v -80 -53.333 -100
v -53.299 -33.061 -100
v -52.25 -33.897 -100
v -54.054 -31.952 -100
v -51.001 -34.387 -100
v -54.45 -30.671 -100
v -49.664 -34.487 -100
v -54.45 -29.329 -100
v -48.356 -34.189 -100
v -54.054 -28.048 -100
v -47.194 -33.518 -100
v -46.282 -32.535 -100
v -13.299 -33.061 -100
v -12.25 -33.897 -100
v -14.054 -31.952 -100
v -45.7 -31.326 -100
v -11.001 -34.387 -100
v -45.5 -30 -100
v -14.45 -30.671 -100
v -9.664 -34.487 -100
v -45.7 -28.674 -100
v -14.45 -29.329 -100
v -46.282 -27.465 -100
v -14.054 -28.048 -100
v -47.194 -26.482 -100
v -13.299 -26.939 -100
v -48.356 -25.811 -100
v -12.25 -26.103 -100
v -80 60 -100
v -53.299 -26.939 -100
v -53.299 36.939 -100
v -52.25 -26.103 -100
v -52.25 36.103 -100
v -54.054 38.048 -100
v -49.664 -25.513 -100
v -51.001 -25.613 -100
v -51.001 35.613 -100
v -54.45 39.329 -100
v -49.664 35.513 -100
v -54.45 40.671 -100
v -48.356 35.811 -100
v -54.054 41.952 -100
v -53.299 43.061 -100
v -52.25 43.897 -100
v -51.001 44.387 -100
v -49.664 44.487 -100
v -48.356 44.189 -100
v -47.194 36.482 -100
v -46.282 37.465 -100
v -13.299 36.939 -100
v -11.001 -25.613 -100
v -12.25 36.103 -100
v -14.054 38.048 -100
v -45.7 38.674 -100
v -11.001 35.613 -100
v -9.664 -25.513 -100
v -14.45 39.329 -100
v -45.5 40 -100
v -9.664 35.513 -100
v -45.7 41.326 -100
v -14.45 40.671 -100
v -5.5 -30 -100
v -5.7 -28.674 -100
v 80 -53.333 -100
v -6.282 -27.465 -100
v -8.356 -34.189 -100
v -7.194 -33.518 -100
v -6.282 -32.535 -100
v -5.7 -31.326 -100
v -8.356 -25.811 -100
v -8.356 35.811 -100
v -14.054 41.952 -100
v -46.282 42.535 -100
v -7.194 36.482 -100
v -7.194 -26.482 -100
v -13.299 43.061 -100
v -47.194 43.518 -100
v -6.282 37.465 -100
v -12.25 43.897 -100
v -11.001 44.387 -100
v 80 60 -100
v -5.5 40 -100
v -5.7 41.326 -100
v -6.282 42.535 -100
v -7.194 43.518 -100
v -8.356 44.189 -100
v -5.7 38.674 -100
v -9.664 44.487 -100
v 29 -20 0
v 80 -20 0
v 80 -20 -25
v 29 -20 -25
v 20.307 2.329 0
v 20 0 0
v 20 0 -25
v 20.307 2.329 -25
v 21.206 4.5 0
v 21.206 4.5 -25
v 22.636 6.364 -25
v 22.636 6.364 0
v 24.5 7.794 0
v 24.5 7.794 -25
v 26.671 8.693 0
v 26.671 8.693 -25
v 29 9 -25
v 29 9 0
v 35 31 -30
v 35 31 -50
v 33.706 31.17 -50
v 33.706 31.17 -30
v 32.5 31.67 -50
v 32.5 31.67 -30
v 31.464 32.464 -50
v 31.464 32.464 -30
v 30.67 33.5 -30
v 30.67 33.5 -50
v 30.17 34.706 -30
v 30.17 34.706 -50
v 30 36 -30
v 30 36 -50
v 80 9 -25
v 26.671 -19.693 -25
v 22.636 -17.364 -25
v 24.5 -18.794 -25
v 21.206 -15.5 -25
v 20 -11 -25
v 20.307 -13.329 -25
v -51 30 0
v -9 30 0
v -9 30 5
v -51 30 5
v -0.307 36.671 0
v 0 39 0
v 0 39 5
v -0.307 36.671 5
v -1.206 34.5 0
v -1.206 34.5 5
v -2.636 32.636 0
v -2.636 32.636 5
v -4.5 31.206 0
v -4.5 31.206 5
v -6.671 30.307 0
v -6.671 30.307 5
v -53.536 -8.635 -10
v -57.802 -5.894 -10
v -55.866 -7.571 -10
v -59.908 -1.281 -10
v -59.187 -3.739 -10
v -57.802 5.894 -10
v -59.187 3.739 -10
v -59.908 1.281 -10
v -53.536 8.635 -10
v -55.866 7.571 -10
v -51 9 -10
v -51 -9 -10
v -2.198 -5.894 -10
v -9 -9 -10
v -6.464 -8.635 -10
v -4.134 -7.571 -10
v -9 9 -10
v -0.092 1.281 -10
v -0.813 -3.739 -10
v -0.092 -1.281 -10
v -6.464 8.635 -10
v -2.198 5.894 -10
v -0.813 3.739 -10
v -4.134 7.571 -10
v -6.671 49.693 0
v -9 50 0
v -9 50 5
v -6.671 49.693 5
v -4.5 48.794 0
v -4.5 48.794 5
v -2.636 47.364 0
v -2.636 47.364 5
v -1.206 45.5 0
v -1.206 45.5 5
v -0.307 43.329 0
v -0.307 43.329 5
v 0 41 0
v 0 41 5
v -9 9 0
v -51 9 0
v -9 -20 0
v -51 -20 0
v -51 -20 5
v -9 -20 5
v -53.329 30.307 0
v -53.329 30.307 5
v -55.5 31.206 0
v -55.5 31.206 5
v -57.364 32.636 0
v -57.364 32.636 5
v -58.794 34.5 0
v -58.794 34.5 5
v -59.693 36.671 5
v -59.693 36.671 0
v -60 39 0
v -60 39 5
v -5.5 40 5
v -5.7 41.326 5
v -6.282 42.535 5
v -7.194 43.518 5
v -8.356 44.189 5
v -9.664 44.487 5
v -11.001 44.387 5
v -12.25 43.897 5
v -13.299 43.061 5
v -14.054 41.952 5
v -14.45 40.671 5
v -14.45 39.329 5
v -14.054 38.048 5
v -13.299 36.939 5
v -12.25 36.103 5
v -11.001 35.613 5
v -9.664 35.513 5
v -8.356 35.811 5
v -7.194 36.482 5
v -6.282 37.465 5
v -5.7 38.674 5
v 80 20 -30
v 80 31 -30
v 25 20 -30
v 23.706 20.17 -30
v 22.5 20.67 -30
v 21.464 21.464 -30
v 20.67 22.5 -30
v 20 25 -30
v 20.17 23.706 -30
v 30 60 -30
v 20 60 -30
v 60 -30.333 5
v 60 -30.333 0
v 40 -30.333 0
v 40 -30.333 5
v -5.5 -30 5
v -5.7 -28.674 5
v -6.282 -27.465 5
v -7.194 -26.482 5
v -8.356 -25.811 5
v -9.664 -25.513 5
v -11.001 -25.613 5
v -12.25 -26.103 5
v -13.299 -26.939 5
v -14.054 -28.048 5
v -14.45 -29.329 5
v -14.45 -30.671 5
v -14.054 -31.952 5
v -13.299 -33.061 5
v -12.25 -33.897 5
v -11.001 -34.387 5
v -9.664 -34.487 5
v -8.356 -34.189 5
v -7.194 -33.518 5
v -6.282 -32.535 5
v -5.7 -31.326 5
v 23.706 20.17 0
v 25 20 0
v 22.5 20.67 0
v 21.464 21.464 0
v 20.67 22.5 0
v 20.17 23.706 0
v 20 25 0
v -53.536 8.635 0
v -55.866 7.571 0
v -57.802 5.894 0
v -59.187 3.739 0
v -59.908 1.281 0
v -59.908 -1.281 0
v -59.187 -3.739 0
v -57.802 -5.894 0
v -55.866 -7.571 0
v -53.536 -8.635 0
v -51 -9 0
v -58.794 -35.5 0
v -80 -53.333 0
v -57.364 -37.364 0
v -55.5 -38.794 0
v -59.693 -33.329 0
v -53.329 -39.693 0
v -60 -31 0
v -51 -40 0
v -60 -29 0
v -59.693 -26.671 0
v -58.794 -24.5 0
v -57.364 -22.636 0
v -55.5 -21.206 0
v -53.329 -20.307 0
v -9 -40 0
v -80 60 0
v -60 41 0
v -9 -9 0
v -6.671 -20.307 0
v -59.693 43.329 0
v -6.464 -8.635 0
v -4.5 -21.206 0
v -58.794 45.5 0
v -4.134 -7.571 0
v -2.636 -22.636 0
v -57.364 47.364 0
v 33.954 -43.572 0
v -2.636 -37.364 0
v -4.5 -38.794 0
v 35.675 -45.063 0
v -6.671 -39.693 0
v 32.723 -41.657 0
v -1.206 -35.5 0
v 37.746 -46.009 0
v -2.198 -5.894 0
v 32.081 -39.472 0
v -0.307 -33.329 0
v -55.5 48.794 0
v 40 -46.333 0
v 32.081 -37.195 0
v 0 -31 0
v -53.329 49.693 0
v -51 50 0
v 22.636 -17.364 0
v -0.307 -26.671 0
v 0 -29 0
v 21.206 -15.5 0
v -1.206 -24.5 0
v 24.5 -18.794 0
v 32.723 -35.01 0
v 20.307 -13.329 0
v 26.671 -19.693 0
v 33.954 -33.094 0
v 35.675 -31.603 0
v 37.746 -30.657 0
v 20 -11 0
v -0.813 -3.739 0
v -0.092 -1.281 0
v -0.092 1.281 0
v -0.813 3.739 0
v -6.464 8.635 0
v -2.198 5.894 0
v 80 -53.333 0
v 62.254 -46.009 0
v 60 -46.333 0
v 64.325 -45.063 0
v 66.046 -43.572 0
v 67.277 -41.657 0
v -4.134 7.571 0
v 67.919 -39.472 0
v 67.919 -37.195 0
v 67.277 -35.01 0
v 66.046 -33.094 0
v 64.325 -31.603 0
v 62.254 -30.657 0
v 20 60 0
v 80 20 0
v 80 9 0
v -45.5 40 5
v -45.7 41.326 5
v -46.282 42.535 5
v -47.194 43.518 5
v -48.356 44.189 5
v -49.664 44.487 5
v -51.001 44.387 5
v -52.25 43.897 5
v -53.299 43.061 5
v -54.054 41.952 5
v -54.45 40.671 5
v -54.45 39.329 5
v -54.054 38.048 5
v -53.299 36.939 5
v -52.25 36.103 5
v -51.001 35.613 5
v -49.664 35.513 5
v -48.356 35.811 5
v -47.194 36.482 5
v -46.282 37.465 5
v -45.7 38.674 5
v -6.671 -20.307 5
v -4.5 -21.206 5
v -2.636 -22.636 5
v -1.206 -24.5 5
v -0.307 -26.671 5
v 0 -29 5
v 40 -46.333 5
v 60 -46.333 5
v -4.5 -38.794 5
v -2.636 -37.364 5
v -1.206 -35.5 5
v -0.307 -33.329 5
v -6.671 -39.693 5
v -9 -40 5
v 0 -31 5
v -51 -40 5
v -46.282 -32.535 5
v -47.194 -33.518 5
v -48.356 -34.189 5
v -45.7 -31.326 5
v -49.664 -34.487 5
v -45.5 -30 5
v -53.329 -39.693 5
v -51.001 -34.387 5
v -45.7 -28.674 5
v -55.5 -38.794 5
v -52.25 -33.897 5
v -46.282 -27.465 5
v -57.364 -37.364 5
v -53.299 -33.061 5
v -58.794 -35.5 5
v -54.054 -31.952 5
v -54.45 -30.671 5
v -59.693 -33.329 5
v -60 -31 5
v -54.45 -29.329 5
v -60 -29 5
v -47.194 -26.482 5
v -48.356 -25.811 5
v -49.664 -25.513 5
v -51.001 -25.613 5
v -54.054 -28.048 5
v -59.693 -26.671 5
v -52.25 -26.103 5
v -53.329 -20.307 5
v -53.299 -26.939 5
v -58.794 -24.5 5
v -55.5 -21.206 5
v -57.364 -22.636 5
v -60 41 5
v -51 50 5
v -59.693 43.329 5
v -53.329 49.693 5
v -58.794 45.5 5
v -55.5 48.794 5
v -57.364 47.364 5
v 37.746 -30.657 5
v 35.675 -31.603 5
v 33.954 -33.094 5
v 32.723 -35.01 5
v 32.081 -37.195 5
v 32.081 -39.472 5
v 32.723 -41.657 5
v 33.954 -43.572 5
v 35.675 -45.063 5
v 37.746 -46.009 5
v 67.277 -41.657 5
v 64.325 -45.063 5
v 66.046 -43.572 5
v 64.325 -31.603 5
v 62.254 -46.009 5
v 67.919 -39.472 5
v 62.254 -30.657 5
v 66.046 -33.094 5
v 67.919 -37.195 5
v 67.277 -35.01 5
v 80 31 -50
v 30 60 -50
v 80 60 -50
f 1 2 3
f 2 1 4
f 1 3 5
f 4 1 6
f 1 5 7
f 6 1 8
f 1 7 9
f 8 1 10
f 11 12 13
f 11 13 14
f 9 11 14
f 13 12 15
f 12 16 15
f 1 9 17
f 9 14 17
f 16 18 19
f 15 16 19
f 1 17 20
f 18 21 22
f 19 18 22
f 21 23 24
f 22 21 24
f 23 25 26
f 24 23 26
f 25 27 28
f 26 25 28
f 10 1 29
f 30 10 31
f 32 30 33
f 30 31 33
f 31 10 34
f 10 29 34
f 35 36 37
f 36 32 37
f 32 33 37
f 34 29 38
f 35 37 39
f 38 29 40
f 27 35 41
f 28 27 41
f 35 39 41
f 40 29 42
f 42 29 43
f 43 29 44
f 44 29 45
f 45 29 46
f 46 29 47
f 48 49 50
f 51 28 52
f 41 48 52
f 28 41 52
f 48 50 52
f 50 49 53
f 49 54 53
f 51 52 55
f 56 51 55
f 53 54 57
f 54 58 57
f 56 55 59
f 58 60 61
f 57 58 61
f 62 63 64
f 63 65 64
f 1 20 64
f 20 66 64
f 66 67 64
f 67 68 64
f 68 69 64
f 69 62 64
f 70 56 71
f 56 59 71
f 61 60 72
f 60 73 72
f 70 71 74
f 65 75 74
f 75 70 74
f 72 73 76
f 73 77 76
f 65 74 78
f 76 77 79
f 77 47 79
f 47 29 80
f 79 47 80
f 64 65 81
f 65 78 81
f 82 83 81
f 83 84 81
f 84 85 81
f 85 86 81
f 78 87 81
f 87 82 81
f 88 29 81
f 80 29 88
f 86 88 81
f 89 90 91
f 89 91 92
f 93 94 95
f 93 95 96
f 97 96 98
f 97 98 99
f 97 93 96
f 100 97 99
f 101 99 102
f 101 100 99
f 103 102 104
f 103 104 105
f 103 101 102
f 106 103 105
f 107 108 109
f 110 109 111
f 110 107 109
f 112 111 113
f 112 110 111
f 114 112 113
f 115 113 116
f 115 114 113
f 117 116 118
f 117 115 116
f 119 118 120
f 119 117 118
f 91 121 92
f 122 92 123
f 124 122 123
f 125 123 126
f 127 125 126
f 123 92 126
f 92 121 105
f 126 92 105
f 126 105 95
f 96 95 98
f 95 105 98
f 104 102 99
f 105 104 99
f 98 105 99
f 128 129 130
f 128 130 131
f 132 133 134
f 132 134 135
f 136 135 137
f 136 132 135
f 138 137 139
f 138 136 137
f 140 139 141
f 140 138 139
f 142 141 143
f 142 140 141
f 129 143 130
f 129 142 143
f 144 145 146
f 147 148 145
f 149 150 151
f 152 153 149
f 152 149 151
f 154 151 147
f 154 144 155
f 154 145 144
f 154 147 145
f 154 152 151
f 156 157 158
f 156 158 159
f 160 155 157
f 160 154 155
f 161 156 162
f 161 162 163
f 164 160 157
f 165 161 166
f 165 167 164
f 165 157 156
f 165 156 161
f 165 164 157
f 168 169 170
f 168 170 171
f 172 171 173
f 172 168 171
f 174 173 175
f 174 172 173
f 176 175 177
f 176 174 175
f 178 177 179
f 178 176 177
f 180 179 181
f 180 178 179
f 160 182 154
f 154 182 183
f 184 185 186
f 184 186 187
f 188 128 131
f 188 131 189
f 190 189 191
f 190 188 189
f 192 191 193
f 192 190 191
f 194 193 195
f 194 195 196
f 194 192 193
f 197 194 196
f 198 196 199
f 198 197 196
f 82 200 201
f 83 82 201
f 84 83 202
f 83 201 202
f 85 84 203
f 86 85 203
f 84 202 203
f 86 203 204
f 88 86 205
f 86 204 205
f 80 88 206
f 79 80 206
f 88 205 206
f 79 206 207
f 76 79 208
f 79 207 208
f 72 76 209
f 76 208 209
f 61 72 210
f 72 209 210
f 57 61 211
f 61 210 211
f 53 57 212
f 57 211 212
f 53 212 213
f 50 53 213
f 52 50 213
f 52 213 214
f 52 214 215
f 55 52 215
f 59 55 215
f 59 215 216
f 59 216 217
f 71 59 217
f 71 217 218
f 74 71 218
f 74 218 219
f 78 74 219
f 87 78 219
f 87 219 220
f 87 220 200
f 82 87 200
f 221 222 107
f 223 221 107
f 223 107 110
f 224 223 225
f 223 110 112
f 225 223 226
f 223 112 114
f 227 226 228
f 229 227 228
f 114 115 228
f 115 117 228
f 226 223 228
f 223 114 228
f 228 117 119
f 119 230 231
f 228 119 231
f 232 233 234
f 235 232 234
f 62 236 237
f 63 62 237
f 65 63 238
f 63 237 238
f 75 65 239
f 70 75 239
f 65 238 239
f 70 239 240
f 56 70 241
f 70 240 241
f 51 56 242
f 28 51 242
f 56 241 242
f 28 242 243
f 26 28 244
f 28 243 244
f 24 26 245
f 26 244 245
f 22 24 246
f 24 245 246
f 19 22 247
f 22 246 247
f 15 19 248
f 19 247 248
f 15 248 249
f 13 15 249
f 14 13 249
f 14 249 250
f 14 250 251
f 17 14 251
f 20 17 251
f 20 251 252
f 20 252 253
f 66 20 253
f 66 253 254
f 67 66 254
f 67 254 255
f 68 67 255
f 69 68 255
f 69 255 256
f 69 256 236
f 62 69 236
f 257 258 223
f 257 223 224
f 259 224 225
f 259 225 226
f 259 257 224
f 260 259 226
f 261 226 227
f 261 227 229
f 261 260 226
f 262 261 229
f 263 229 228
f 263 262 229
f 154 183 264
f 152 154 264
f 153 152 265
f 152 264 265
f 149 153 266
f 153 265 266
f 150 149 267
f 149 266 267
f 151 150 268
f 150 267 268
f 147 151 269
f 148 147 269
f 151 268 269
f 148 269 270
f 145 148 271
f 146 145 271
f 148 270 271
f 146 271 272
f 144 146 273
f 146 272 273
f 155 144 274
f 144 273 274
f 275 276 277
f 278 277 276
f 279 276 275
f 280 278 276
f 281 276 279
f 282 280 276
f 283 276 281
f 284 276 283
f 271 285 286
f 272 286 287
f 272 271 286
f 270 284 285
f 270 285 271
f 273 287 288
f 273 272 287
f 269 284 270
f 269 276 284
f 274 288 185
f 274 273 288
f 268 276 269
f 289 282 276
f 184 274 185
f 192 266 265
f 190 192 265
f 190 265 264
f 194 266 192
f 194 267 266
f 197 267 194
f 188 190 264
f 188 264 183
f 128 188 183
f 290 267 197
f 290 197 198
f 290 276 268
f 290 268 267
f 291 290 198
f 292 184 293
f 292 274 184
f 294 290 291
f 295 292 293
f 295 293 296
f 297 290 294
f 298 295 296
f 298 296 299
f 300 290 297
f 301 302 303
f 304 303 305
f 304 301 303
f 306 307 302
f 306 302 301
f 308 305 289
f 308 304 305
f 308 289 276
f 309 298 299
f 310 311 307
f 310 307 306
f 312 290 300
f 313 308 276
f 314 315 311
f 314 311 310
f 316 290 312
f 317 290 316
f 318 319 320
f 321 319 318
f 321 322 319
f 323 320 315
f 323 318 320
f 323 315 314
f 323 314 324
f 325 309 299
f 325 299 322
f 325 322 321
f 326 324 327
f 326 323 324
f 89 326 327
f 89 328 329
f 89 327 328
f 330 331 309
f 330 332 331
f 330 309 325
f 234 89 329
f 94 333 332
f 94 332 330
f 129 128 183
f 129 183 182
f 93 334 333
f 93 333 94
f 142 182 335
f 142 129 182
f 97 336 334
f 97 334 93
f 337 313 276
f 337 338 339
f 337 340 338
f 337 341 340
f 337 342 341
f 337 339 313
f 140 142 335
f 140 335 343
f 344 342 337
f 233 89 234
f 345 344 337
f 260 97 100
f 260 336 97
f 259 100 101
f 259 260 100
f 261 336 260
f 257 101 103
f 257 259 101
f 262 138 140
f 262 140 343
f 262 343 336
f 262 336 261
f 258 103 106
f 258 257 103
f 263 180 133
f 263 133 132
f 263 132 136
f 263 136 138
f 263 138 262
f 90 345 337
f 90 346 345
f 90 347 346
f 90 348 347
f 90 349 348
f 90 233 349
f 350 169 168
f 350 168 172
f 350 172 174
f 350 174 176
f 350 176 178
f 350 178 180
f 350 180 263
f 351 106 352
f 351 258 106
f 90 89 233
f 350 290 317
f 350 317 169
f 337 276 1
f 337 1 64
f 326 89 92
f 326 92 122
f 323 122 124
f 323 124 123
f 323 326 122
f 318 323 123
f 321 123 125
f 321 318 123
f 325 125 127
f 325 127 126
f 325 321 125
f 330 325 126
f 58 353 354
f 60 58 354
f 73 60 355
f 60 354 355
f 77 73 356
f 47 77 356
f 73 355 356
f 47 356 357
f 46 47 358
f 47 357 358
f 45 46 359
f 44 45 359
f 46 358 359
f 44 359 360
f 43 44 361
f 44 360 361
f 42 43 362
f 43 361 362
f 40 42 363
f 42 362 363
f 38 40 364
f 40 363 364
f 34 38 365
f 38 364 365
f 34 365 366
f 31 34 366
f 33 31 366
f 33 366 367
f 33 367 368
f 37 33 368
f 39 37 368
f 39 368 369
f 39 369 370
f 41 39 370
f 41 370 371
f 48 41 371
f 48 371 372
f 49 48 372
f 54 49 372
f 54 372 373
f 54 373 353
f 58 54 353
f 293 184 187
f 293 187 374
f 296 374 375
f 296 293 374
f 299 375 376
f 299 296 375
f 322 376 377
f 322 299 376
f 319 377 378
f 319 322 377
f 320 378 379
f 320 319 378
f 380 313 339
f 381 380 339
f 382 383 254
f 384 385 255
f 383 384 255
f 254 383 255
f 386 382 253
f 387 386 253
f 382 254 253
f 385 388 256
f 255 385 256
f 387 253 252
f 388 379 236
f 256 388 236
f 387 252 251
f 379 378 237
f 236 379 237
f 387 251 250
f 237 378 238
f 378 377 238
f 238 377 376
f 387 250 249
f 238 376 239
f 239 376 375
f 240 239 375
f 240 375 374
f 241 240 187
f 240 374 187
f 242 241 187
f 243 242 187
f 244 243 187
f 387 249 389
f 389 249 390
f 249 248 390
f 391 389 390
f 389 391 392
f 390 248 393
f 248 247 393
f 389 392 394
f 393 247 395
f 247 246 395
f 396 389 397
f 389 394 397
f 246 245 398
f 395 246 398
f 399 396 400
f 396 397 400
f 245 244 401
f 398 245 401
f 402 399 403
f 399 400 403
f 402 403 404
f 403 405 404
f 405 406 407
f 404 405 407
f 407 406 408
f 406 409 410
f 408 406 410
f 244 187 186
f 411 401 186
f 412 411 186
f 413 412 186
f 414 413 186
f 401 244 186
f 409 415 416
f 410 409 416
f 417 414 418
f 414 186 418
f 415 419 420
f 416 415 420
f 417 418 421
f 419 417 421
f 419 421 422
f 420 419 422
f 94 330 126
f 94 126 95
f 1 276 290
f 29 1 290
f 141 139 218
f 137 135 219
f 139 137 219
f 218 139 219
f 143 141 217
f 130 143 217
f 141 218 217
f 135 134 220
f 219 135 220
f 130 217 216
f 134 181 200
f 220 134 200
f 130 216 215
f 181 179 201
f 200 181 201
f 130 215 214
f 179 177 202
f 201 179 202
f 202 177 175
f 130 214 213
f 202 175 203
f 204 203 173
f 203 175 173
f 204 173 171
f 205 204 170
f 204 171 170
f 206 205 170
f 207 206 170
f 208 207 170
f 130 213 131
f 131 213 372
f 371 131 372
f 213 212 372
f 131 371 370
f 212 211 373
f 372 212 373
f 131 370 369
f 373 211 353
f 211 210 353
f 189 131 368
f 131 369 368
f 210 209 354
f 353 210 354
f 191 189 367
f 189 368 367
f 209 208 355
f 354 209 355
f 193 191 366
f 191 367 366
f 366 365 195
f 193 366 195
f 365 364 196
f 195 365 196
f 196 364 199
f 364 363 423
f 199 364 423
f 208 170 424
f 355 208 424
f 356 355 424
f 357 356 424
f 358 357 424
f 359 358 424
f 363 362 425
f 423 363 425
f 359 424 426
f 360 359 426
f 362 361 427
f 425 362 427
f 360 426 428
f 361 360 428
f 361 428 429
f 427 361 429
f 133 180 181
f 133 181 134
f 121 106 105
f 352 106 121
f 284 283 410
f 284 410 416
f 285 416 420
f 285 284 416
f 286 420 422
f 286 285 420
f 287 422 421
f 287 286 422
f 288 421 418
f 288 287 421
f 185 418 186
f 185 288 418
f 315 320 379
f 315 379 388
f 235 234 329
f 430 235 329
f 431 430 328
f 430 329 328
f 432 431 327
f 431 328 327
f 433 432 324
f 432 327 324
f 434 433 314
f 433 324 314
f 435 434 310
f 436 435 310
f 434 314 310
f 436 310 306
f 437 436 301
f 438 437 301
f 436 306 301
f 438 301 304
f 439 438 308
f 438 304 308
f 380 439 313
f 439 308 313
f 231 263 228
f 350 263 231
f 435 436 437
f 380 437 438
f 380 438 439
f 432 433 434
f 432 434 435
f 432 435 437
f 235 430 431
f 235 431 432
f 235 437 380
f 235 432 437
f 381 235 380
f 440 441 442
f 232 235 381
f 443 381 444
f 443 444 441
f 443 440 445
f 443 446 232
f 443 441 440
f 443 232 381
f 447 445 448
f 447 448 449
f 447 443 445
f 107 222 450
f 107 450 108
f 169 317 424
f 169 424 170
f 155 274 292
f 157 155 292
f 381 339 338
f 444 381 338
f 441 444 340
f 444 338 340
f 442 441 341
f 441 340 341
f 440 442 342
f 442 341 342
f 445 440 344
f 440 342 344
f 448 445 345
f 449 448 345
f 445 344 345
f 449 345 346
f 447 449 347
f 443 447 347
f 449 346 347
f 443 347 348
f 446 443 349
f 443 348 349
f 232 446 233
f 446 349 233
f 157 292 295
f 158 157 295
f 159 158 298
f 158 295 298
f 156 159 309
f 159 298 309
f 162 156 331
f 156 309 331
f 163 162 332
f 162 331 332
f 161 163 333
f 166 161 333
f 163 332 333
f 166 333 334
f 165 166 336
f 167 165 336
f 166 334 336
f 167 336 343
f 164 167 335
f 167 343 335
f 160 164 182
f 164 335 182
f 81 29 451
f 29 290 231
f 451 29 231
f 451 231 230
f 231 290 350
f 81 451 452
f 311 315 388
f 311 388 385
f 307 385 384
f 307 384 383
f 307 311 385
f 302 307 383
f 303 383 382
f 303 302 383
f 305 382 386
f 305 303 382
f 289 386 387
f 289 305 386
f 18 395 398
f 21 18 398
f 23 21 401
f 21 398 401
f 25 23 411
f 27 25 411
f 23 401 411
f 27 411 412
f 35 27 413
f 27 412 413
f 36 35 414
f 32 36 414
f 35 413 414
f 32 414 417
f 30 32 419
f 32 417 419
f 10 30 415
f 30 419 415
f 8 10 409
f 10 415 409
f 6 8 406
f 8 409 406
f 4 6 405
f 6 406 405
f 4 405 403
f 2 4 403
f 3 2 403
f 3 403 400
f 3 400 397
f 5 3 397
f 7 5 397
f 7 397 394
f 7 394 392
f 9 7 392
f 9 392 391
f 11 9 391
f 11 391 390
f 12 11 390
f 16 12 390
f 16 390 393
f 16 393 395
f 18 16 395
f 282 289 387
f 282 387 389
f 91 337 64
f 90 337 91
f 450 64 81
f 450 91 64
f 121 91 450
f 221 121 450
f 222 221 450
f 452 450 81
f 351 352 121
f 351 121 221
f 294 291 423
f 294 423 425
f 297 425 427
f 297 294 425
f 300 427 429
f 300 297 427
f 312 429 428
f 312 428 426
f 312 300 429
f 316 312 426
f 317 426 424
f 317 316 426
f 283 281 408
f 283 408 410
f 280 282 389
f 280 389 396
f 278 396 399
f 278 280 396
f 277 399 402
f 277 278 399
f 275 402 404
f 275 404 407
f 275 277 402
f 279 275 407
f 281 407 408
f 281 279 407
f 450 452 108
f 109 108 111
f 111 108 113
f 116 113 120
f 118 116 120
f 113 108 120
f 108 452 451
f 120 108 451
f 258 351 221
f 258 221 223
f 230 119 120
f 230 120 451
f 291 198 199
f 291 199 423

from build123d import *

# Parameters (mm, degrees)
SKETCH1_W           = 160
SKETCH1_H           = 113.333333333
BASE_EXTRUDE_DEPTH  = 100
BOSS_EXTRUDE1_DEPTH = 5
CUT_EXTRUDE1_DEPTH  = 10
CUT_EXTRUDE2_DEPTH  = 30
CUT_EXTRUDE3_DEPTH  = 20
SKETCH7_R           = 4.5
CUT_EXTRUDE4_DEPTH  = 146
CUT_EXTRUDE5_DEPTH  = 25


with BuildPart() as part:
    # Sketch1 → Base-Extrude (new body)
    with BuildSketch(Plane.XY):
        with Locations((0, 3.333333334)):
            Rectangle(SKETCH1_W, SKETCH1_H)
    extrude(amount=-BASE_EXTRUDE_DEPTH)

    # Sketch2 → Boss-Extrude1 (add)
    with BuildSketch(Plane.XY):
        with BuildLine():
            Line((-51, -20), (-9, -20))
            ThreePointArc((-9, -20), (-2.636038969, -22.636038969), (0, -29))
            Line((0, -29), (0, -31))
            ThreePointArc((0, -31), (-2.636038969, -37.363961031), (-9, -40))
            Line((-9, -40), (-51, -40))
            ThreePointArc((-51, -40), (-57.363961031, -37.363961031), (-60, -31))
            Line((-60, -31), (-60, -29))
            ThreePointArc((-60, -29), (-57.363961031, -22.636038969), (-51, -20))
        make_face()
        with BuildLine():
            Line((-51, 50), (-9, 50))
            ThreePointArc((-9, 50), (-2.636038969, 47.363961031), (0, 41))
            Line((0, 41), (0, 39))
            ThreePointArc((0, 39), (-2.636038969, 32.636038969), (-9, 30))
            Line((-9, 30), (-51, 30))
            ThreePointArc((-51, 30), (-57.363961031, 32.636038969), (-60, 39))
            Line((-60, 39), (-60, 41))
            ThreePointArc((-60, 41), (-57.363961031, 47.363961031), (-51, 50))
        make_face()
        with BuildLine():
            Line((60, -30.333333333), (40, -30.333333333))
            ThreePointArc((40, -30.333333333), (32, -38.333333333), (40, -46.333333333))
            Line((40, -46.333333333), (60, -46.333333333))
            ThreePointArc((60, -46.333333333), (68, -38.333333333), (60, -30.333333333))
        make_face()
    extrude(amount=BOSS_EXTRUDE1_DEPTH)

    # Sketch3 → Cut-Extrude1 (cut)
    with BuildSketch(Plane.XY):
        with BuildLine():
            Line((-9, 9), (-51, 9))
            ThreePointArc((-51, 9), (-60, 0), (-51, -9))
            Line((-51, -9), (-9, -9))
            ThreePointArc((-9, -9), (0, 0), (-9, 9))
        make_face()
    extrude(amount=-CUT_EXTRUDE1_DEPTH, mode=Mode.SUBTRACT)

    # Sketch4 → Cut-Extrude2 (cut)
    with BuildSketch(Plane.XY):
        with BuildLine():
            Line((20, 80), (93.333333333, 80))
            Line((93.333333333, 80), (93.333333333, 20))
            Line((93.333333333, 20), (25, 20))
            ThreePointArc((25, 20), (21.464466094, 21.464466094), (20, 25))
            Line((20, 25), (20, 80))
        make_face()
    extrude(amount=-CUT_EXTRUDE2_DEPTH, mode=Mode.SUBTRACT)

    # Sketch5 → Cut-Extrude3 (cut)
    with BuildSketch(Plane.XY.offset(-30)):
        with BuildLine():
            Line((30, 70), (98.390848549, 70))
            Line((98.390848549, 70), (98.390848549, 31))
            Line((98.390848549, 31), (35, 31))
            ThreePointArc((35, 31), (31.464466094, 32.464466094), (30, 36))
            Line((30, 36), (30, 70))
        make_face()
    extrude(amount=-CUT_EXTRUDE3_DEPTH, mode=Mode.SUBTRACT)

    # Sketch7 → Cut-Extrude4 (cut, through all)
    with BuildSketch(Plane.XY.offset(5)):
        with Locations((-50, -30)):
            Circle(SKETCH7_R)
        with Locations((-10, -30)):
            Circle(SKETCH7_R)
        with Locations((-50, 40)):
            Circle(SKETCH7_R)
        with Locations((-10, 40)):
            Circle(SKETCH7_R)
    extrude(amount=-CUT_EXTRUDE4_DEPTH, mode=Mode.SUBTRACT)

    # Sketch9 → Cut-Extrude5 (cut)
    with BuildSketch(Plane.XY):
        with BuildLine():
            Line((29, 9), (103.333333333, 9))
            Line((103.333333333, 9), (103.333333333, -20))
            Line((103.333333333, -20), (29, -20))
            ThreePointArc((29, -20), (22.636038969, -17.363961031), (20, -11))
            Line((20, -11), (20, 0))
            ThreePointArc((20, 0), (22.636038969, 6.363961031), (29, 9))
        make_face()
    extrude(amount=-CUT_EXTRUDE5_DEPTH, mode=Mode.SUBTRACT)


solid = part.part
